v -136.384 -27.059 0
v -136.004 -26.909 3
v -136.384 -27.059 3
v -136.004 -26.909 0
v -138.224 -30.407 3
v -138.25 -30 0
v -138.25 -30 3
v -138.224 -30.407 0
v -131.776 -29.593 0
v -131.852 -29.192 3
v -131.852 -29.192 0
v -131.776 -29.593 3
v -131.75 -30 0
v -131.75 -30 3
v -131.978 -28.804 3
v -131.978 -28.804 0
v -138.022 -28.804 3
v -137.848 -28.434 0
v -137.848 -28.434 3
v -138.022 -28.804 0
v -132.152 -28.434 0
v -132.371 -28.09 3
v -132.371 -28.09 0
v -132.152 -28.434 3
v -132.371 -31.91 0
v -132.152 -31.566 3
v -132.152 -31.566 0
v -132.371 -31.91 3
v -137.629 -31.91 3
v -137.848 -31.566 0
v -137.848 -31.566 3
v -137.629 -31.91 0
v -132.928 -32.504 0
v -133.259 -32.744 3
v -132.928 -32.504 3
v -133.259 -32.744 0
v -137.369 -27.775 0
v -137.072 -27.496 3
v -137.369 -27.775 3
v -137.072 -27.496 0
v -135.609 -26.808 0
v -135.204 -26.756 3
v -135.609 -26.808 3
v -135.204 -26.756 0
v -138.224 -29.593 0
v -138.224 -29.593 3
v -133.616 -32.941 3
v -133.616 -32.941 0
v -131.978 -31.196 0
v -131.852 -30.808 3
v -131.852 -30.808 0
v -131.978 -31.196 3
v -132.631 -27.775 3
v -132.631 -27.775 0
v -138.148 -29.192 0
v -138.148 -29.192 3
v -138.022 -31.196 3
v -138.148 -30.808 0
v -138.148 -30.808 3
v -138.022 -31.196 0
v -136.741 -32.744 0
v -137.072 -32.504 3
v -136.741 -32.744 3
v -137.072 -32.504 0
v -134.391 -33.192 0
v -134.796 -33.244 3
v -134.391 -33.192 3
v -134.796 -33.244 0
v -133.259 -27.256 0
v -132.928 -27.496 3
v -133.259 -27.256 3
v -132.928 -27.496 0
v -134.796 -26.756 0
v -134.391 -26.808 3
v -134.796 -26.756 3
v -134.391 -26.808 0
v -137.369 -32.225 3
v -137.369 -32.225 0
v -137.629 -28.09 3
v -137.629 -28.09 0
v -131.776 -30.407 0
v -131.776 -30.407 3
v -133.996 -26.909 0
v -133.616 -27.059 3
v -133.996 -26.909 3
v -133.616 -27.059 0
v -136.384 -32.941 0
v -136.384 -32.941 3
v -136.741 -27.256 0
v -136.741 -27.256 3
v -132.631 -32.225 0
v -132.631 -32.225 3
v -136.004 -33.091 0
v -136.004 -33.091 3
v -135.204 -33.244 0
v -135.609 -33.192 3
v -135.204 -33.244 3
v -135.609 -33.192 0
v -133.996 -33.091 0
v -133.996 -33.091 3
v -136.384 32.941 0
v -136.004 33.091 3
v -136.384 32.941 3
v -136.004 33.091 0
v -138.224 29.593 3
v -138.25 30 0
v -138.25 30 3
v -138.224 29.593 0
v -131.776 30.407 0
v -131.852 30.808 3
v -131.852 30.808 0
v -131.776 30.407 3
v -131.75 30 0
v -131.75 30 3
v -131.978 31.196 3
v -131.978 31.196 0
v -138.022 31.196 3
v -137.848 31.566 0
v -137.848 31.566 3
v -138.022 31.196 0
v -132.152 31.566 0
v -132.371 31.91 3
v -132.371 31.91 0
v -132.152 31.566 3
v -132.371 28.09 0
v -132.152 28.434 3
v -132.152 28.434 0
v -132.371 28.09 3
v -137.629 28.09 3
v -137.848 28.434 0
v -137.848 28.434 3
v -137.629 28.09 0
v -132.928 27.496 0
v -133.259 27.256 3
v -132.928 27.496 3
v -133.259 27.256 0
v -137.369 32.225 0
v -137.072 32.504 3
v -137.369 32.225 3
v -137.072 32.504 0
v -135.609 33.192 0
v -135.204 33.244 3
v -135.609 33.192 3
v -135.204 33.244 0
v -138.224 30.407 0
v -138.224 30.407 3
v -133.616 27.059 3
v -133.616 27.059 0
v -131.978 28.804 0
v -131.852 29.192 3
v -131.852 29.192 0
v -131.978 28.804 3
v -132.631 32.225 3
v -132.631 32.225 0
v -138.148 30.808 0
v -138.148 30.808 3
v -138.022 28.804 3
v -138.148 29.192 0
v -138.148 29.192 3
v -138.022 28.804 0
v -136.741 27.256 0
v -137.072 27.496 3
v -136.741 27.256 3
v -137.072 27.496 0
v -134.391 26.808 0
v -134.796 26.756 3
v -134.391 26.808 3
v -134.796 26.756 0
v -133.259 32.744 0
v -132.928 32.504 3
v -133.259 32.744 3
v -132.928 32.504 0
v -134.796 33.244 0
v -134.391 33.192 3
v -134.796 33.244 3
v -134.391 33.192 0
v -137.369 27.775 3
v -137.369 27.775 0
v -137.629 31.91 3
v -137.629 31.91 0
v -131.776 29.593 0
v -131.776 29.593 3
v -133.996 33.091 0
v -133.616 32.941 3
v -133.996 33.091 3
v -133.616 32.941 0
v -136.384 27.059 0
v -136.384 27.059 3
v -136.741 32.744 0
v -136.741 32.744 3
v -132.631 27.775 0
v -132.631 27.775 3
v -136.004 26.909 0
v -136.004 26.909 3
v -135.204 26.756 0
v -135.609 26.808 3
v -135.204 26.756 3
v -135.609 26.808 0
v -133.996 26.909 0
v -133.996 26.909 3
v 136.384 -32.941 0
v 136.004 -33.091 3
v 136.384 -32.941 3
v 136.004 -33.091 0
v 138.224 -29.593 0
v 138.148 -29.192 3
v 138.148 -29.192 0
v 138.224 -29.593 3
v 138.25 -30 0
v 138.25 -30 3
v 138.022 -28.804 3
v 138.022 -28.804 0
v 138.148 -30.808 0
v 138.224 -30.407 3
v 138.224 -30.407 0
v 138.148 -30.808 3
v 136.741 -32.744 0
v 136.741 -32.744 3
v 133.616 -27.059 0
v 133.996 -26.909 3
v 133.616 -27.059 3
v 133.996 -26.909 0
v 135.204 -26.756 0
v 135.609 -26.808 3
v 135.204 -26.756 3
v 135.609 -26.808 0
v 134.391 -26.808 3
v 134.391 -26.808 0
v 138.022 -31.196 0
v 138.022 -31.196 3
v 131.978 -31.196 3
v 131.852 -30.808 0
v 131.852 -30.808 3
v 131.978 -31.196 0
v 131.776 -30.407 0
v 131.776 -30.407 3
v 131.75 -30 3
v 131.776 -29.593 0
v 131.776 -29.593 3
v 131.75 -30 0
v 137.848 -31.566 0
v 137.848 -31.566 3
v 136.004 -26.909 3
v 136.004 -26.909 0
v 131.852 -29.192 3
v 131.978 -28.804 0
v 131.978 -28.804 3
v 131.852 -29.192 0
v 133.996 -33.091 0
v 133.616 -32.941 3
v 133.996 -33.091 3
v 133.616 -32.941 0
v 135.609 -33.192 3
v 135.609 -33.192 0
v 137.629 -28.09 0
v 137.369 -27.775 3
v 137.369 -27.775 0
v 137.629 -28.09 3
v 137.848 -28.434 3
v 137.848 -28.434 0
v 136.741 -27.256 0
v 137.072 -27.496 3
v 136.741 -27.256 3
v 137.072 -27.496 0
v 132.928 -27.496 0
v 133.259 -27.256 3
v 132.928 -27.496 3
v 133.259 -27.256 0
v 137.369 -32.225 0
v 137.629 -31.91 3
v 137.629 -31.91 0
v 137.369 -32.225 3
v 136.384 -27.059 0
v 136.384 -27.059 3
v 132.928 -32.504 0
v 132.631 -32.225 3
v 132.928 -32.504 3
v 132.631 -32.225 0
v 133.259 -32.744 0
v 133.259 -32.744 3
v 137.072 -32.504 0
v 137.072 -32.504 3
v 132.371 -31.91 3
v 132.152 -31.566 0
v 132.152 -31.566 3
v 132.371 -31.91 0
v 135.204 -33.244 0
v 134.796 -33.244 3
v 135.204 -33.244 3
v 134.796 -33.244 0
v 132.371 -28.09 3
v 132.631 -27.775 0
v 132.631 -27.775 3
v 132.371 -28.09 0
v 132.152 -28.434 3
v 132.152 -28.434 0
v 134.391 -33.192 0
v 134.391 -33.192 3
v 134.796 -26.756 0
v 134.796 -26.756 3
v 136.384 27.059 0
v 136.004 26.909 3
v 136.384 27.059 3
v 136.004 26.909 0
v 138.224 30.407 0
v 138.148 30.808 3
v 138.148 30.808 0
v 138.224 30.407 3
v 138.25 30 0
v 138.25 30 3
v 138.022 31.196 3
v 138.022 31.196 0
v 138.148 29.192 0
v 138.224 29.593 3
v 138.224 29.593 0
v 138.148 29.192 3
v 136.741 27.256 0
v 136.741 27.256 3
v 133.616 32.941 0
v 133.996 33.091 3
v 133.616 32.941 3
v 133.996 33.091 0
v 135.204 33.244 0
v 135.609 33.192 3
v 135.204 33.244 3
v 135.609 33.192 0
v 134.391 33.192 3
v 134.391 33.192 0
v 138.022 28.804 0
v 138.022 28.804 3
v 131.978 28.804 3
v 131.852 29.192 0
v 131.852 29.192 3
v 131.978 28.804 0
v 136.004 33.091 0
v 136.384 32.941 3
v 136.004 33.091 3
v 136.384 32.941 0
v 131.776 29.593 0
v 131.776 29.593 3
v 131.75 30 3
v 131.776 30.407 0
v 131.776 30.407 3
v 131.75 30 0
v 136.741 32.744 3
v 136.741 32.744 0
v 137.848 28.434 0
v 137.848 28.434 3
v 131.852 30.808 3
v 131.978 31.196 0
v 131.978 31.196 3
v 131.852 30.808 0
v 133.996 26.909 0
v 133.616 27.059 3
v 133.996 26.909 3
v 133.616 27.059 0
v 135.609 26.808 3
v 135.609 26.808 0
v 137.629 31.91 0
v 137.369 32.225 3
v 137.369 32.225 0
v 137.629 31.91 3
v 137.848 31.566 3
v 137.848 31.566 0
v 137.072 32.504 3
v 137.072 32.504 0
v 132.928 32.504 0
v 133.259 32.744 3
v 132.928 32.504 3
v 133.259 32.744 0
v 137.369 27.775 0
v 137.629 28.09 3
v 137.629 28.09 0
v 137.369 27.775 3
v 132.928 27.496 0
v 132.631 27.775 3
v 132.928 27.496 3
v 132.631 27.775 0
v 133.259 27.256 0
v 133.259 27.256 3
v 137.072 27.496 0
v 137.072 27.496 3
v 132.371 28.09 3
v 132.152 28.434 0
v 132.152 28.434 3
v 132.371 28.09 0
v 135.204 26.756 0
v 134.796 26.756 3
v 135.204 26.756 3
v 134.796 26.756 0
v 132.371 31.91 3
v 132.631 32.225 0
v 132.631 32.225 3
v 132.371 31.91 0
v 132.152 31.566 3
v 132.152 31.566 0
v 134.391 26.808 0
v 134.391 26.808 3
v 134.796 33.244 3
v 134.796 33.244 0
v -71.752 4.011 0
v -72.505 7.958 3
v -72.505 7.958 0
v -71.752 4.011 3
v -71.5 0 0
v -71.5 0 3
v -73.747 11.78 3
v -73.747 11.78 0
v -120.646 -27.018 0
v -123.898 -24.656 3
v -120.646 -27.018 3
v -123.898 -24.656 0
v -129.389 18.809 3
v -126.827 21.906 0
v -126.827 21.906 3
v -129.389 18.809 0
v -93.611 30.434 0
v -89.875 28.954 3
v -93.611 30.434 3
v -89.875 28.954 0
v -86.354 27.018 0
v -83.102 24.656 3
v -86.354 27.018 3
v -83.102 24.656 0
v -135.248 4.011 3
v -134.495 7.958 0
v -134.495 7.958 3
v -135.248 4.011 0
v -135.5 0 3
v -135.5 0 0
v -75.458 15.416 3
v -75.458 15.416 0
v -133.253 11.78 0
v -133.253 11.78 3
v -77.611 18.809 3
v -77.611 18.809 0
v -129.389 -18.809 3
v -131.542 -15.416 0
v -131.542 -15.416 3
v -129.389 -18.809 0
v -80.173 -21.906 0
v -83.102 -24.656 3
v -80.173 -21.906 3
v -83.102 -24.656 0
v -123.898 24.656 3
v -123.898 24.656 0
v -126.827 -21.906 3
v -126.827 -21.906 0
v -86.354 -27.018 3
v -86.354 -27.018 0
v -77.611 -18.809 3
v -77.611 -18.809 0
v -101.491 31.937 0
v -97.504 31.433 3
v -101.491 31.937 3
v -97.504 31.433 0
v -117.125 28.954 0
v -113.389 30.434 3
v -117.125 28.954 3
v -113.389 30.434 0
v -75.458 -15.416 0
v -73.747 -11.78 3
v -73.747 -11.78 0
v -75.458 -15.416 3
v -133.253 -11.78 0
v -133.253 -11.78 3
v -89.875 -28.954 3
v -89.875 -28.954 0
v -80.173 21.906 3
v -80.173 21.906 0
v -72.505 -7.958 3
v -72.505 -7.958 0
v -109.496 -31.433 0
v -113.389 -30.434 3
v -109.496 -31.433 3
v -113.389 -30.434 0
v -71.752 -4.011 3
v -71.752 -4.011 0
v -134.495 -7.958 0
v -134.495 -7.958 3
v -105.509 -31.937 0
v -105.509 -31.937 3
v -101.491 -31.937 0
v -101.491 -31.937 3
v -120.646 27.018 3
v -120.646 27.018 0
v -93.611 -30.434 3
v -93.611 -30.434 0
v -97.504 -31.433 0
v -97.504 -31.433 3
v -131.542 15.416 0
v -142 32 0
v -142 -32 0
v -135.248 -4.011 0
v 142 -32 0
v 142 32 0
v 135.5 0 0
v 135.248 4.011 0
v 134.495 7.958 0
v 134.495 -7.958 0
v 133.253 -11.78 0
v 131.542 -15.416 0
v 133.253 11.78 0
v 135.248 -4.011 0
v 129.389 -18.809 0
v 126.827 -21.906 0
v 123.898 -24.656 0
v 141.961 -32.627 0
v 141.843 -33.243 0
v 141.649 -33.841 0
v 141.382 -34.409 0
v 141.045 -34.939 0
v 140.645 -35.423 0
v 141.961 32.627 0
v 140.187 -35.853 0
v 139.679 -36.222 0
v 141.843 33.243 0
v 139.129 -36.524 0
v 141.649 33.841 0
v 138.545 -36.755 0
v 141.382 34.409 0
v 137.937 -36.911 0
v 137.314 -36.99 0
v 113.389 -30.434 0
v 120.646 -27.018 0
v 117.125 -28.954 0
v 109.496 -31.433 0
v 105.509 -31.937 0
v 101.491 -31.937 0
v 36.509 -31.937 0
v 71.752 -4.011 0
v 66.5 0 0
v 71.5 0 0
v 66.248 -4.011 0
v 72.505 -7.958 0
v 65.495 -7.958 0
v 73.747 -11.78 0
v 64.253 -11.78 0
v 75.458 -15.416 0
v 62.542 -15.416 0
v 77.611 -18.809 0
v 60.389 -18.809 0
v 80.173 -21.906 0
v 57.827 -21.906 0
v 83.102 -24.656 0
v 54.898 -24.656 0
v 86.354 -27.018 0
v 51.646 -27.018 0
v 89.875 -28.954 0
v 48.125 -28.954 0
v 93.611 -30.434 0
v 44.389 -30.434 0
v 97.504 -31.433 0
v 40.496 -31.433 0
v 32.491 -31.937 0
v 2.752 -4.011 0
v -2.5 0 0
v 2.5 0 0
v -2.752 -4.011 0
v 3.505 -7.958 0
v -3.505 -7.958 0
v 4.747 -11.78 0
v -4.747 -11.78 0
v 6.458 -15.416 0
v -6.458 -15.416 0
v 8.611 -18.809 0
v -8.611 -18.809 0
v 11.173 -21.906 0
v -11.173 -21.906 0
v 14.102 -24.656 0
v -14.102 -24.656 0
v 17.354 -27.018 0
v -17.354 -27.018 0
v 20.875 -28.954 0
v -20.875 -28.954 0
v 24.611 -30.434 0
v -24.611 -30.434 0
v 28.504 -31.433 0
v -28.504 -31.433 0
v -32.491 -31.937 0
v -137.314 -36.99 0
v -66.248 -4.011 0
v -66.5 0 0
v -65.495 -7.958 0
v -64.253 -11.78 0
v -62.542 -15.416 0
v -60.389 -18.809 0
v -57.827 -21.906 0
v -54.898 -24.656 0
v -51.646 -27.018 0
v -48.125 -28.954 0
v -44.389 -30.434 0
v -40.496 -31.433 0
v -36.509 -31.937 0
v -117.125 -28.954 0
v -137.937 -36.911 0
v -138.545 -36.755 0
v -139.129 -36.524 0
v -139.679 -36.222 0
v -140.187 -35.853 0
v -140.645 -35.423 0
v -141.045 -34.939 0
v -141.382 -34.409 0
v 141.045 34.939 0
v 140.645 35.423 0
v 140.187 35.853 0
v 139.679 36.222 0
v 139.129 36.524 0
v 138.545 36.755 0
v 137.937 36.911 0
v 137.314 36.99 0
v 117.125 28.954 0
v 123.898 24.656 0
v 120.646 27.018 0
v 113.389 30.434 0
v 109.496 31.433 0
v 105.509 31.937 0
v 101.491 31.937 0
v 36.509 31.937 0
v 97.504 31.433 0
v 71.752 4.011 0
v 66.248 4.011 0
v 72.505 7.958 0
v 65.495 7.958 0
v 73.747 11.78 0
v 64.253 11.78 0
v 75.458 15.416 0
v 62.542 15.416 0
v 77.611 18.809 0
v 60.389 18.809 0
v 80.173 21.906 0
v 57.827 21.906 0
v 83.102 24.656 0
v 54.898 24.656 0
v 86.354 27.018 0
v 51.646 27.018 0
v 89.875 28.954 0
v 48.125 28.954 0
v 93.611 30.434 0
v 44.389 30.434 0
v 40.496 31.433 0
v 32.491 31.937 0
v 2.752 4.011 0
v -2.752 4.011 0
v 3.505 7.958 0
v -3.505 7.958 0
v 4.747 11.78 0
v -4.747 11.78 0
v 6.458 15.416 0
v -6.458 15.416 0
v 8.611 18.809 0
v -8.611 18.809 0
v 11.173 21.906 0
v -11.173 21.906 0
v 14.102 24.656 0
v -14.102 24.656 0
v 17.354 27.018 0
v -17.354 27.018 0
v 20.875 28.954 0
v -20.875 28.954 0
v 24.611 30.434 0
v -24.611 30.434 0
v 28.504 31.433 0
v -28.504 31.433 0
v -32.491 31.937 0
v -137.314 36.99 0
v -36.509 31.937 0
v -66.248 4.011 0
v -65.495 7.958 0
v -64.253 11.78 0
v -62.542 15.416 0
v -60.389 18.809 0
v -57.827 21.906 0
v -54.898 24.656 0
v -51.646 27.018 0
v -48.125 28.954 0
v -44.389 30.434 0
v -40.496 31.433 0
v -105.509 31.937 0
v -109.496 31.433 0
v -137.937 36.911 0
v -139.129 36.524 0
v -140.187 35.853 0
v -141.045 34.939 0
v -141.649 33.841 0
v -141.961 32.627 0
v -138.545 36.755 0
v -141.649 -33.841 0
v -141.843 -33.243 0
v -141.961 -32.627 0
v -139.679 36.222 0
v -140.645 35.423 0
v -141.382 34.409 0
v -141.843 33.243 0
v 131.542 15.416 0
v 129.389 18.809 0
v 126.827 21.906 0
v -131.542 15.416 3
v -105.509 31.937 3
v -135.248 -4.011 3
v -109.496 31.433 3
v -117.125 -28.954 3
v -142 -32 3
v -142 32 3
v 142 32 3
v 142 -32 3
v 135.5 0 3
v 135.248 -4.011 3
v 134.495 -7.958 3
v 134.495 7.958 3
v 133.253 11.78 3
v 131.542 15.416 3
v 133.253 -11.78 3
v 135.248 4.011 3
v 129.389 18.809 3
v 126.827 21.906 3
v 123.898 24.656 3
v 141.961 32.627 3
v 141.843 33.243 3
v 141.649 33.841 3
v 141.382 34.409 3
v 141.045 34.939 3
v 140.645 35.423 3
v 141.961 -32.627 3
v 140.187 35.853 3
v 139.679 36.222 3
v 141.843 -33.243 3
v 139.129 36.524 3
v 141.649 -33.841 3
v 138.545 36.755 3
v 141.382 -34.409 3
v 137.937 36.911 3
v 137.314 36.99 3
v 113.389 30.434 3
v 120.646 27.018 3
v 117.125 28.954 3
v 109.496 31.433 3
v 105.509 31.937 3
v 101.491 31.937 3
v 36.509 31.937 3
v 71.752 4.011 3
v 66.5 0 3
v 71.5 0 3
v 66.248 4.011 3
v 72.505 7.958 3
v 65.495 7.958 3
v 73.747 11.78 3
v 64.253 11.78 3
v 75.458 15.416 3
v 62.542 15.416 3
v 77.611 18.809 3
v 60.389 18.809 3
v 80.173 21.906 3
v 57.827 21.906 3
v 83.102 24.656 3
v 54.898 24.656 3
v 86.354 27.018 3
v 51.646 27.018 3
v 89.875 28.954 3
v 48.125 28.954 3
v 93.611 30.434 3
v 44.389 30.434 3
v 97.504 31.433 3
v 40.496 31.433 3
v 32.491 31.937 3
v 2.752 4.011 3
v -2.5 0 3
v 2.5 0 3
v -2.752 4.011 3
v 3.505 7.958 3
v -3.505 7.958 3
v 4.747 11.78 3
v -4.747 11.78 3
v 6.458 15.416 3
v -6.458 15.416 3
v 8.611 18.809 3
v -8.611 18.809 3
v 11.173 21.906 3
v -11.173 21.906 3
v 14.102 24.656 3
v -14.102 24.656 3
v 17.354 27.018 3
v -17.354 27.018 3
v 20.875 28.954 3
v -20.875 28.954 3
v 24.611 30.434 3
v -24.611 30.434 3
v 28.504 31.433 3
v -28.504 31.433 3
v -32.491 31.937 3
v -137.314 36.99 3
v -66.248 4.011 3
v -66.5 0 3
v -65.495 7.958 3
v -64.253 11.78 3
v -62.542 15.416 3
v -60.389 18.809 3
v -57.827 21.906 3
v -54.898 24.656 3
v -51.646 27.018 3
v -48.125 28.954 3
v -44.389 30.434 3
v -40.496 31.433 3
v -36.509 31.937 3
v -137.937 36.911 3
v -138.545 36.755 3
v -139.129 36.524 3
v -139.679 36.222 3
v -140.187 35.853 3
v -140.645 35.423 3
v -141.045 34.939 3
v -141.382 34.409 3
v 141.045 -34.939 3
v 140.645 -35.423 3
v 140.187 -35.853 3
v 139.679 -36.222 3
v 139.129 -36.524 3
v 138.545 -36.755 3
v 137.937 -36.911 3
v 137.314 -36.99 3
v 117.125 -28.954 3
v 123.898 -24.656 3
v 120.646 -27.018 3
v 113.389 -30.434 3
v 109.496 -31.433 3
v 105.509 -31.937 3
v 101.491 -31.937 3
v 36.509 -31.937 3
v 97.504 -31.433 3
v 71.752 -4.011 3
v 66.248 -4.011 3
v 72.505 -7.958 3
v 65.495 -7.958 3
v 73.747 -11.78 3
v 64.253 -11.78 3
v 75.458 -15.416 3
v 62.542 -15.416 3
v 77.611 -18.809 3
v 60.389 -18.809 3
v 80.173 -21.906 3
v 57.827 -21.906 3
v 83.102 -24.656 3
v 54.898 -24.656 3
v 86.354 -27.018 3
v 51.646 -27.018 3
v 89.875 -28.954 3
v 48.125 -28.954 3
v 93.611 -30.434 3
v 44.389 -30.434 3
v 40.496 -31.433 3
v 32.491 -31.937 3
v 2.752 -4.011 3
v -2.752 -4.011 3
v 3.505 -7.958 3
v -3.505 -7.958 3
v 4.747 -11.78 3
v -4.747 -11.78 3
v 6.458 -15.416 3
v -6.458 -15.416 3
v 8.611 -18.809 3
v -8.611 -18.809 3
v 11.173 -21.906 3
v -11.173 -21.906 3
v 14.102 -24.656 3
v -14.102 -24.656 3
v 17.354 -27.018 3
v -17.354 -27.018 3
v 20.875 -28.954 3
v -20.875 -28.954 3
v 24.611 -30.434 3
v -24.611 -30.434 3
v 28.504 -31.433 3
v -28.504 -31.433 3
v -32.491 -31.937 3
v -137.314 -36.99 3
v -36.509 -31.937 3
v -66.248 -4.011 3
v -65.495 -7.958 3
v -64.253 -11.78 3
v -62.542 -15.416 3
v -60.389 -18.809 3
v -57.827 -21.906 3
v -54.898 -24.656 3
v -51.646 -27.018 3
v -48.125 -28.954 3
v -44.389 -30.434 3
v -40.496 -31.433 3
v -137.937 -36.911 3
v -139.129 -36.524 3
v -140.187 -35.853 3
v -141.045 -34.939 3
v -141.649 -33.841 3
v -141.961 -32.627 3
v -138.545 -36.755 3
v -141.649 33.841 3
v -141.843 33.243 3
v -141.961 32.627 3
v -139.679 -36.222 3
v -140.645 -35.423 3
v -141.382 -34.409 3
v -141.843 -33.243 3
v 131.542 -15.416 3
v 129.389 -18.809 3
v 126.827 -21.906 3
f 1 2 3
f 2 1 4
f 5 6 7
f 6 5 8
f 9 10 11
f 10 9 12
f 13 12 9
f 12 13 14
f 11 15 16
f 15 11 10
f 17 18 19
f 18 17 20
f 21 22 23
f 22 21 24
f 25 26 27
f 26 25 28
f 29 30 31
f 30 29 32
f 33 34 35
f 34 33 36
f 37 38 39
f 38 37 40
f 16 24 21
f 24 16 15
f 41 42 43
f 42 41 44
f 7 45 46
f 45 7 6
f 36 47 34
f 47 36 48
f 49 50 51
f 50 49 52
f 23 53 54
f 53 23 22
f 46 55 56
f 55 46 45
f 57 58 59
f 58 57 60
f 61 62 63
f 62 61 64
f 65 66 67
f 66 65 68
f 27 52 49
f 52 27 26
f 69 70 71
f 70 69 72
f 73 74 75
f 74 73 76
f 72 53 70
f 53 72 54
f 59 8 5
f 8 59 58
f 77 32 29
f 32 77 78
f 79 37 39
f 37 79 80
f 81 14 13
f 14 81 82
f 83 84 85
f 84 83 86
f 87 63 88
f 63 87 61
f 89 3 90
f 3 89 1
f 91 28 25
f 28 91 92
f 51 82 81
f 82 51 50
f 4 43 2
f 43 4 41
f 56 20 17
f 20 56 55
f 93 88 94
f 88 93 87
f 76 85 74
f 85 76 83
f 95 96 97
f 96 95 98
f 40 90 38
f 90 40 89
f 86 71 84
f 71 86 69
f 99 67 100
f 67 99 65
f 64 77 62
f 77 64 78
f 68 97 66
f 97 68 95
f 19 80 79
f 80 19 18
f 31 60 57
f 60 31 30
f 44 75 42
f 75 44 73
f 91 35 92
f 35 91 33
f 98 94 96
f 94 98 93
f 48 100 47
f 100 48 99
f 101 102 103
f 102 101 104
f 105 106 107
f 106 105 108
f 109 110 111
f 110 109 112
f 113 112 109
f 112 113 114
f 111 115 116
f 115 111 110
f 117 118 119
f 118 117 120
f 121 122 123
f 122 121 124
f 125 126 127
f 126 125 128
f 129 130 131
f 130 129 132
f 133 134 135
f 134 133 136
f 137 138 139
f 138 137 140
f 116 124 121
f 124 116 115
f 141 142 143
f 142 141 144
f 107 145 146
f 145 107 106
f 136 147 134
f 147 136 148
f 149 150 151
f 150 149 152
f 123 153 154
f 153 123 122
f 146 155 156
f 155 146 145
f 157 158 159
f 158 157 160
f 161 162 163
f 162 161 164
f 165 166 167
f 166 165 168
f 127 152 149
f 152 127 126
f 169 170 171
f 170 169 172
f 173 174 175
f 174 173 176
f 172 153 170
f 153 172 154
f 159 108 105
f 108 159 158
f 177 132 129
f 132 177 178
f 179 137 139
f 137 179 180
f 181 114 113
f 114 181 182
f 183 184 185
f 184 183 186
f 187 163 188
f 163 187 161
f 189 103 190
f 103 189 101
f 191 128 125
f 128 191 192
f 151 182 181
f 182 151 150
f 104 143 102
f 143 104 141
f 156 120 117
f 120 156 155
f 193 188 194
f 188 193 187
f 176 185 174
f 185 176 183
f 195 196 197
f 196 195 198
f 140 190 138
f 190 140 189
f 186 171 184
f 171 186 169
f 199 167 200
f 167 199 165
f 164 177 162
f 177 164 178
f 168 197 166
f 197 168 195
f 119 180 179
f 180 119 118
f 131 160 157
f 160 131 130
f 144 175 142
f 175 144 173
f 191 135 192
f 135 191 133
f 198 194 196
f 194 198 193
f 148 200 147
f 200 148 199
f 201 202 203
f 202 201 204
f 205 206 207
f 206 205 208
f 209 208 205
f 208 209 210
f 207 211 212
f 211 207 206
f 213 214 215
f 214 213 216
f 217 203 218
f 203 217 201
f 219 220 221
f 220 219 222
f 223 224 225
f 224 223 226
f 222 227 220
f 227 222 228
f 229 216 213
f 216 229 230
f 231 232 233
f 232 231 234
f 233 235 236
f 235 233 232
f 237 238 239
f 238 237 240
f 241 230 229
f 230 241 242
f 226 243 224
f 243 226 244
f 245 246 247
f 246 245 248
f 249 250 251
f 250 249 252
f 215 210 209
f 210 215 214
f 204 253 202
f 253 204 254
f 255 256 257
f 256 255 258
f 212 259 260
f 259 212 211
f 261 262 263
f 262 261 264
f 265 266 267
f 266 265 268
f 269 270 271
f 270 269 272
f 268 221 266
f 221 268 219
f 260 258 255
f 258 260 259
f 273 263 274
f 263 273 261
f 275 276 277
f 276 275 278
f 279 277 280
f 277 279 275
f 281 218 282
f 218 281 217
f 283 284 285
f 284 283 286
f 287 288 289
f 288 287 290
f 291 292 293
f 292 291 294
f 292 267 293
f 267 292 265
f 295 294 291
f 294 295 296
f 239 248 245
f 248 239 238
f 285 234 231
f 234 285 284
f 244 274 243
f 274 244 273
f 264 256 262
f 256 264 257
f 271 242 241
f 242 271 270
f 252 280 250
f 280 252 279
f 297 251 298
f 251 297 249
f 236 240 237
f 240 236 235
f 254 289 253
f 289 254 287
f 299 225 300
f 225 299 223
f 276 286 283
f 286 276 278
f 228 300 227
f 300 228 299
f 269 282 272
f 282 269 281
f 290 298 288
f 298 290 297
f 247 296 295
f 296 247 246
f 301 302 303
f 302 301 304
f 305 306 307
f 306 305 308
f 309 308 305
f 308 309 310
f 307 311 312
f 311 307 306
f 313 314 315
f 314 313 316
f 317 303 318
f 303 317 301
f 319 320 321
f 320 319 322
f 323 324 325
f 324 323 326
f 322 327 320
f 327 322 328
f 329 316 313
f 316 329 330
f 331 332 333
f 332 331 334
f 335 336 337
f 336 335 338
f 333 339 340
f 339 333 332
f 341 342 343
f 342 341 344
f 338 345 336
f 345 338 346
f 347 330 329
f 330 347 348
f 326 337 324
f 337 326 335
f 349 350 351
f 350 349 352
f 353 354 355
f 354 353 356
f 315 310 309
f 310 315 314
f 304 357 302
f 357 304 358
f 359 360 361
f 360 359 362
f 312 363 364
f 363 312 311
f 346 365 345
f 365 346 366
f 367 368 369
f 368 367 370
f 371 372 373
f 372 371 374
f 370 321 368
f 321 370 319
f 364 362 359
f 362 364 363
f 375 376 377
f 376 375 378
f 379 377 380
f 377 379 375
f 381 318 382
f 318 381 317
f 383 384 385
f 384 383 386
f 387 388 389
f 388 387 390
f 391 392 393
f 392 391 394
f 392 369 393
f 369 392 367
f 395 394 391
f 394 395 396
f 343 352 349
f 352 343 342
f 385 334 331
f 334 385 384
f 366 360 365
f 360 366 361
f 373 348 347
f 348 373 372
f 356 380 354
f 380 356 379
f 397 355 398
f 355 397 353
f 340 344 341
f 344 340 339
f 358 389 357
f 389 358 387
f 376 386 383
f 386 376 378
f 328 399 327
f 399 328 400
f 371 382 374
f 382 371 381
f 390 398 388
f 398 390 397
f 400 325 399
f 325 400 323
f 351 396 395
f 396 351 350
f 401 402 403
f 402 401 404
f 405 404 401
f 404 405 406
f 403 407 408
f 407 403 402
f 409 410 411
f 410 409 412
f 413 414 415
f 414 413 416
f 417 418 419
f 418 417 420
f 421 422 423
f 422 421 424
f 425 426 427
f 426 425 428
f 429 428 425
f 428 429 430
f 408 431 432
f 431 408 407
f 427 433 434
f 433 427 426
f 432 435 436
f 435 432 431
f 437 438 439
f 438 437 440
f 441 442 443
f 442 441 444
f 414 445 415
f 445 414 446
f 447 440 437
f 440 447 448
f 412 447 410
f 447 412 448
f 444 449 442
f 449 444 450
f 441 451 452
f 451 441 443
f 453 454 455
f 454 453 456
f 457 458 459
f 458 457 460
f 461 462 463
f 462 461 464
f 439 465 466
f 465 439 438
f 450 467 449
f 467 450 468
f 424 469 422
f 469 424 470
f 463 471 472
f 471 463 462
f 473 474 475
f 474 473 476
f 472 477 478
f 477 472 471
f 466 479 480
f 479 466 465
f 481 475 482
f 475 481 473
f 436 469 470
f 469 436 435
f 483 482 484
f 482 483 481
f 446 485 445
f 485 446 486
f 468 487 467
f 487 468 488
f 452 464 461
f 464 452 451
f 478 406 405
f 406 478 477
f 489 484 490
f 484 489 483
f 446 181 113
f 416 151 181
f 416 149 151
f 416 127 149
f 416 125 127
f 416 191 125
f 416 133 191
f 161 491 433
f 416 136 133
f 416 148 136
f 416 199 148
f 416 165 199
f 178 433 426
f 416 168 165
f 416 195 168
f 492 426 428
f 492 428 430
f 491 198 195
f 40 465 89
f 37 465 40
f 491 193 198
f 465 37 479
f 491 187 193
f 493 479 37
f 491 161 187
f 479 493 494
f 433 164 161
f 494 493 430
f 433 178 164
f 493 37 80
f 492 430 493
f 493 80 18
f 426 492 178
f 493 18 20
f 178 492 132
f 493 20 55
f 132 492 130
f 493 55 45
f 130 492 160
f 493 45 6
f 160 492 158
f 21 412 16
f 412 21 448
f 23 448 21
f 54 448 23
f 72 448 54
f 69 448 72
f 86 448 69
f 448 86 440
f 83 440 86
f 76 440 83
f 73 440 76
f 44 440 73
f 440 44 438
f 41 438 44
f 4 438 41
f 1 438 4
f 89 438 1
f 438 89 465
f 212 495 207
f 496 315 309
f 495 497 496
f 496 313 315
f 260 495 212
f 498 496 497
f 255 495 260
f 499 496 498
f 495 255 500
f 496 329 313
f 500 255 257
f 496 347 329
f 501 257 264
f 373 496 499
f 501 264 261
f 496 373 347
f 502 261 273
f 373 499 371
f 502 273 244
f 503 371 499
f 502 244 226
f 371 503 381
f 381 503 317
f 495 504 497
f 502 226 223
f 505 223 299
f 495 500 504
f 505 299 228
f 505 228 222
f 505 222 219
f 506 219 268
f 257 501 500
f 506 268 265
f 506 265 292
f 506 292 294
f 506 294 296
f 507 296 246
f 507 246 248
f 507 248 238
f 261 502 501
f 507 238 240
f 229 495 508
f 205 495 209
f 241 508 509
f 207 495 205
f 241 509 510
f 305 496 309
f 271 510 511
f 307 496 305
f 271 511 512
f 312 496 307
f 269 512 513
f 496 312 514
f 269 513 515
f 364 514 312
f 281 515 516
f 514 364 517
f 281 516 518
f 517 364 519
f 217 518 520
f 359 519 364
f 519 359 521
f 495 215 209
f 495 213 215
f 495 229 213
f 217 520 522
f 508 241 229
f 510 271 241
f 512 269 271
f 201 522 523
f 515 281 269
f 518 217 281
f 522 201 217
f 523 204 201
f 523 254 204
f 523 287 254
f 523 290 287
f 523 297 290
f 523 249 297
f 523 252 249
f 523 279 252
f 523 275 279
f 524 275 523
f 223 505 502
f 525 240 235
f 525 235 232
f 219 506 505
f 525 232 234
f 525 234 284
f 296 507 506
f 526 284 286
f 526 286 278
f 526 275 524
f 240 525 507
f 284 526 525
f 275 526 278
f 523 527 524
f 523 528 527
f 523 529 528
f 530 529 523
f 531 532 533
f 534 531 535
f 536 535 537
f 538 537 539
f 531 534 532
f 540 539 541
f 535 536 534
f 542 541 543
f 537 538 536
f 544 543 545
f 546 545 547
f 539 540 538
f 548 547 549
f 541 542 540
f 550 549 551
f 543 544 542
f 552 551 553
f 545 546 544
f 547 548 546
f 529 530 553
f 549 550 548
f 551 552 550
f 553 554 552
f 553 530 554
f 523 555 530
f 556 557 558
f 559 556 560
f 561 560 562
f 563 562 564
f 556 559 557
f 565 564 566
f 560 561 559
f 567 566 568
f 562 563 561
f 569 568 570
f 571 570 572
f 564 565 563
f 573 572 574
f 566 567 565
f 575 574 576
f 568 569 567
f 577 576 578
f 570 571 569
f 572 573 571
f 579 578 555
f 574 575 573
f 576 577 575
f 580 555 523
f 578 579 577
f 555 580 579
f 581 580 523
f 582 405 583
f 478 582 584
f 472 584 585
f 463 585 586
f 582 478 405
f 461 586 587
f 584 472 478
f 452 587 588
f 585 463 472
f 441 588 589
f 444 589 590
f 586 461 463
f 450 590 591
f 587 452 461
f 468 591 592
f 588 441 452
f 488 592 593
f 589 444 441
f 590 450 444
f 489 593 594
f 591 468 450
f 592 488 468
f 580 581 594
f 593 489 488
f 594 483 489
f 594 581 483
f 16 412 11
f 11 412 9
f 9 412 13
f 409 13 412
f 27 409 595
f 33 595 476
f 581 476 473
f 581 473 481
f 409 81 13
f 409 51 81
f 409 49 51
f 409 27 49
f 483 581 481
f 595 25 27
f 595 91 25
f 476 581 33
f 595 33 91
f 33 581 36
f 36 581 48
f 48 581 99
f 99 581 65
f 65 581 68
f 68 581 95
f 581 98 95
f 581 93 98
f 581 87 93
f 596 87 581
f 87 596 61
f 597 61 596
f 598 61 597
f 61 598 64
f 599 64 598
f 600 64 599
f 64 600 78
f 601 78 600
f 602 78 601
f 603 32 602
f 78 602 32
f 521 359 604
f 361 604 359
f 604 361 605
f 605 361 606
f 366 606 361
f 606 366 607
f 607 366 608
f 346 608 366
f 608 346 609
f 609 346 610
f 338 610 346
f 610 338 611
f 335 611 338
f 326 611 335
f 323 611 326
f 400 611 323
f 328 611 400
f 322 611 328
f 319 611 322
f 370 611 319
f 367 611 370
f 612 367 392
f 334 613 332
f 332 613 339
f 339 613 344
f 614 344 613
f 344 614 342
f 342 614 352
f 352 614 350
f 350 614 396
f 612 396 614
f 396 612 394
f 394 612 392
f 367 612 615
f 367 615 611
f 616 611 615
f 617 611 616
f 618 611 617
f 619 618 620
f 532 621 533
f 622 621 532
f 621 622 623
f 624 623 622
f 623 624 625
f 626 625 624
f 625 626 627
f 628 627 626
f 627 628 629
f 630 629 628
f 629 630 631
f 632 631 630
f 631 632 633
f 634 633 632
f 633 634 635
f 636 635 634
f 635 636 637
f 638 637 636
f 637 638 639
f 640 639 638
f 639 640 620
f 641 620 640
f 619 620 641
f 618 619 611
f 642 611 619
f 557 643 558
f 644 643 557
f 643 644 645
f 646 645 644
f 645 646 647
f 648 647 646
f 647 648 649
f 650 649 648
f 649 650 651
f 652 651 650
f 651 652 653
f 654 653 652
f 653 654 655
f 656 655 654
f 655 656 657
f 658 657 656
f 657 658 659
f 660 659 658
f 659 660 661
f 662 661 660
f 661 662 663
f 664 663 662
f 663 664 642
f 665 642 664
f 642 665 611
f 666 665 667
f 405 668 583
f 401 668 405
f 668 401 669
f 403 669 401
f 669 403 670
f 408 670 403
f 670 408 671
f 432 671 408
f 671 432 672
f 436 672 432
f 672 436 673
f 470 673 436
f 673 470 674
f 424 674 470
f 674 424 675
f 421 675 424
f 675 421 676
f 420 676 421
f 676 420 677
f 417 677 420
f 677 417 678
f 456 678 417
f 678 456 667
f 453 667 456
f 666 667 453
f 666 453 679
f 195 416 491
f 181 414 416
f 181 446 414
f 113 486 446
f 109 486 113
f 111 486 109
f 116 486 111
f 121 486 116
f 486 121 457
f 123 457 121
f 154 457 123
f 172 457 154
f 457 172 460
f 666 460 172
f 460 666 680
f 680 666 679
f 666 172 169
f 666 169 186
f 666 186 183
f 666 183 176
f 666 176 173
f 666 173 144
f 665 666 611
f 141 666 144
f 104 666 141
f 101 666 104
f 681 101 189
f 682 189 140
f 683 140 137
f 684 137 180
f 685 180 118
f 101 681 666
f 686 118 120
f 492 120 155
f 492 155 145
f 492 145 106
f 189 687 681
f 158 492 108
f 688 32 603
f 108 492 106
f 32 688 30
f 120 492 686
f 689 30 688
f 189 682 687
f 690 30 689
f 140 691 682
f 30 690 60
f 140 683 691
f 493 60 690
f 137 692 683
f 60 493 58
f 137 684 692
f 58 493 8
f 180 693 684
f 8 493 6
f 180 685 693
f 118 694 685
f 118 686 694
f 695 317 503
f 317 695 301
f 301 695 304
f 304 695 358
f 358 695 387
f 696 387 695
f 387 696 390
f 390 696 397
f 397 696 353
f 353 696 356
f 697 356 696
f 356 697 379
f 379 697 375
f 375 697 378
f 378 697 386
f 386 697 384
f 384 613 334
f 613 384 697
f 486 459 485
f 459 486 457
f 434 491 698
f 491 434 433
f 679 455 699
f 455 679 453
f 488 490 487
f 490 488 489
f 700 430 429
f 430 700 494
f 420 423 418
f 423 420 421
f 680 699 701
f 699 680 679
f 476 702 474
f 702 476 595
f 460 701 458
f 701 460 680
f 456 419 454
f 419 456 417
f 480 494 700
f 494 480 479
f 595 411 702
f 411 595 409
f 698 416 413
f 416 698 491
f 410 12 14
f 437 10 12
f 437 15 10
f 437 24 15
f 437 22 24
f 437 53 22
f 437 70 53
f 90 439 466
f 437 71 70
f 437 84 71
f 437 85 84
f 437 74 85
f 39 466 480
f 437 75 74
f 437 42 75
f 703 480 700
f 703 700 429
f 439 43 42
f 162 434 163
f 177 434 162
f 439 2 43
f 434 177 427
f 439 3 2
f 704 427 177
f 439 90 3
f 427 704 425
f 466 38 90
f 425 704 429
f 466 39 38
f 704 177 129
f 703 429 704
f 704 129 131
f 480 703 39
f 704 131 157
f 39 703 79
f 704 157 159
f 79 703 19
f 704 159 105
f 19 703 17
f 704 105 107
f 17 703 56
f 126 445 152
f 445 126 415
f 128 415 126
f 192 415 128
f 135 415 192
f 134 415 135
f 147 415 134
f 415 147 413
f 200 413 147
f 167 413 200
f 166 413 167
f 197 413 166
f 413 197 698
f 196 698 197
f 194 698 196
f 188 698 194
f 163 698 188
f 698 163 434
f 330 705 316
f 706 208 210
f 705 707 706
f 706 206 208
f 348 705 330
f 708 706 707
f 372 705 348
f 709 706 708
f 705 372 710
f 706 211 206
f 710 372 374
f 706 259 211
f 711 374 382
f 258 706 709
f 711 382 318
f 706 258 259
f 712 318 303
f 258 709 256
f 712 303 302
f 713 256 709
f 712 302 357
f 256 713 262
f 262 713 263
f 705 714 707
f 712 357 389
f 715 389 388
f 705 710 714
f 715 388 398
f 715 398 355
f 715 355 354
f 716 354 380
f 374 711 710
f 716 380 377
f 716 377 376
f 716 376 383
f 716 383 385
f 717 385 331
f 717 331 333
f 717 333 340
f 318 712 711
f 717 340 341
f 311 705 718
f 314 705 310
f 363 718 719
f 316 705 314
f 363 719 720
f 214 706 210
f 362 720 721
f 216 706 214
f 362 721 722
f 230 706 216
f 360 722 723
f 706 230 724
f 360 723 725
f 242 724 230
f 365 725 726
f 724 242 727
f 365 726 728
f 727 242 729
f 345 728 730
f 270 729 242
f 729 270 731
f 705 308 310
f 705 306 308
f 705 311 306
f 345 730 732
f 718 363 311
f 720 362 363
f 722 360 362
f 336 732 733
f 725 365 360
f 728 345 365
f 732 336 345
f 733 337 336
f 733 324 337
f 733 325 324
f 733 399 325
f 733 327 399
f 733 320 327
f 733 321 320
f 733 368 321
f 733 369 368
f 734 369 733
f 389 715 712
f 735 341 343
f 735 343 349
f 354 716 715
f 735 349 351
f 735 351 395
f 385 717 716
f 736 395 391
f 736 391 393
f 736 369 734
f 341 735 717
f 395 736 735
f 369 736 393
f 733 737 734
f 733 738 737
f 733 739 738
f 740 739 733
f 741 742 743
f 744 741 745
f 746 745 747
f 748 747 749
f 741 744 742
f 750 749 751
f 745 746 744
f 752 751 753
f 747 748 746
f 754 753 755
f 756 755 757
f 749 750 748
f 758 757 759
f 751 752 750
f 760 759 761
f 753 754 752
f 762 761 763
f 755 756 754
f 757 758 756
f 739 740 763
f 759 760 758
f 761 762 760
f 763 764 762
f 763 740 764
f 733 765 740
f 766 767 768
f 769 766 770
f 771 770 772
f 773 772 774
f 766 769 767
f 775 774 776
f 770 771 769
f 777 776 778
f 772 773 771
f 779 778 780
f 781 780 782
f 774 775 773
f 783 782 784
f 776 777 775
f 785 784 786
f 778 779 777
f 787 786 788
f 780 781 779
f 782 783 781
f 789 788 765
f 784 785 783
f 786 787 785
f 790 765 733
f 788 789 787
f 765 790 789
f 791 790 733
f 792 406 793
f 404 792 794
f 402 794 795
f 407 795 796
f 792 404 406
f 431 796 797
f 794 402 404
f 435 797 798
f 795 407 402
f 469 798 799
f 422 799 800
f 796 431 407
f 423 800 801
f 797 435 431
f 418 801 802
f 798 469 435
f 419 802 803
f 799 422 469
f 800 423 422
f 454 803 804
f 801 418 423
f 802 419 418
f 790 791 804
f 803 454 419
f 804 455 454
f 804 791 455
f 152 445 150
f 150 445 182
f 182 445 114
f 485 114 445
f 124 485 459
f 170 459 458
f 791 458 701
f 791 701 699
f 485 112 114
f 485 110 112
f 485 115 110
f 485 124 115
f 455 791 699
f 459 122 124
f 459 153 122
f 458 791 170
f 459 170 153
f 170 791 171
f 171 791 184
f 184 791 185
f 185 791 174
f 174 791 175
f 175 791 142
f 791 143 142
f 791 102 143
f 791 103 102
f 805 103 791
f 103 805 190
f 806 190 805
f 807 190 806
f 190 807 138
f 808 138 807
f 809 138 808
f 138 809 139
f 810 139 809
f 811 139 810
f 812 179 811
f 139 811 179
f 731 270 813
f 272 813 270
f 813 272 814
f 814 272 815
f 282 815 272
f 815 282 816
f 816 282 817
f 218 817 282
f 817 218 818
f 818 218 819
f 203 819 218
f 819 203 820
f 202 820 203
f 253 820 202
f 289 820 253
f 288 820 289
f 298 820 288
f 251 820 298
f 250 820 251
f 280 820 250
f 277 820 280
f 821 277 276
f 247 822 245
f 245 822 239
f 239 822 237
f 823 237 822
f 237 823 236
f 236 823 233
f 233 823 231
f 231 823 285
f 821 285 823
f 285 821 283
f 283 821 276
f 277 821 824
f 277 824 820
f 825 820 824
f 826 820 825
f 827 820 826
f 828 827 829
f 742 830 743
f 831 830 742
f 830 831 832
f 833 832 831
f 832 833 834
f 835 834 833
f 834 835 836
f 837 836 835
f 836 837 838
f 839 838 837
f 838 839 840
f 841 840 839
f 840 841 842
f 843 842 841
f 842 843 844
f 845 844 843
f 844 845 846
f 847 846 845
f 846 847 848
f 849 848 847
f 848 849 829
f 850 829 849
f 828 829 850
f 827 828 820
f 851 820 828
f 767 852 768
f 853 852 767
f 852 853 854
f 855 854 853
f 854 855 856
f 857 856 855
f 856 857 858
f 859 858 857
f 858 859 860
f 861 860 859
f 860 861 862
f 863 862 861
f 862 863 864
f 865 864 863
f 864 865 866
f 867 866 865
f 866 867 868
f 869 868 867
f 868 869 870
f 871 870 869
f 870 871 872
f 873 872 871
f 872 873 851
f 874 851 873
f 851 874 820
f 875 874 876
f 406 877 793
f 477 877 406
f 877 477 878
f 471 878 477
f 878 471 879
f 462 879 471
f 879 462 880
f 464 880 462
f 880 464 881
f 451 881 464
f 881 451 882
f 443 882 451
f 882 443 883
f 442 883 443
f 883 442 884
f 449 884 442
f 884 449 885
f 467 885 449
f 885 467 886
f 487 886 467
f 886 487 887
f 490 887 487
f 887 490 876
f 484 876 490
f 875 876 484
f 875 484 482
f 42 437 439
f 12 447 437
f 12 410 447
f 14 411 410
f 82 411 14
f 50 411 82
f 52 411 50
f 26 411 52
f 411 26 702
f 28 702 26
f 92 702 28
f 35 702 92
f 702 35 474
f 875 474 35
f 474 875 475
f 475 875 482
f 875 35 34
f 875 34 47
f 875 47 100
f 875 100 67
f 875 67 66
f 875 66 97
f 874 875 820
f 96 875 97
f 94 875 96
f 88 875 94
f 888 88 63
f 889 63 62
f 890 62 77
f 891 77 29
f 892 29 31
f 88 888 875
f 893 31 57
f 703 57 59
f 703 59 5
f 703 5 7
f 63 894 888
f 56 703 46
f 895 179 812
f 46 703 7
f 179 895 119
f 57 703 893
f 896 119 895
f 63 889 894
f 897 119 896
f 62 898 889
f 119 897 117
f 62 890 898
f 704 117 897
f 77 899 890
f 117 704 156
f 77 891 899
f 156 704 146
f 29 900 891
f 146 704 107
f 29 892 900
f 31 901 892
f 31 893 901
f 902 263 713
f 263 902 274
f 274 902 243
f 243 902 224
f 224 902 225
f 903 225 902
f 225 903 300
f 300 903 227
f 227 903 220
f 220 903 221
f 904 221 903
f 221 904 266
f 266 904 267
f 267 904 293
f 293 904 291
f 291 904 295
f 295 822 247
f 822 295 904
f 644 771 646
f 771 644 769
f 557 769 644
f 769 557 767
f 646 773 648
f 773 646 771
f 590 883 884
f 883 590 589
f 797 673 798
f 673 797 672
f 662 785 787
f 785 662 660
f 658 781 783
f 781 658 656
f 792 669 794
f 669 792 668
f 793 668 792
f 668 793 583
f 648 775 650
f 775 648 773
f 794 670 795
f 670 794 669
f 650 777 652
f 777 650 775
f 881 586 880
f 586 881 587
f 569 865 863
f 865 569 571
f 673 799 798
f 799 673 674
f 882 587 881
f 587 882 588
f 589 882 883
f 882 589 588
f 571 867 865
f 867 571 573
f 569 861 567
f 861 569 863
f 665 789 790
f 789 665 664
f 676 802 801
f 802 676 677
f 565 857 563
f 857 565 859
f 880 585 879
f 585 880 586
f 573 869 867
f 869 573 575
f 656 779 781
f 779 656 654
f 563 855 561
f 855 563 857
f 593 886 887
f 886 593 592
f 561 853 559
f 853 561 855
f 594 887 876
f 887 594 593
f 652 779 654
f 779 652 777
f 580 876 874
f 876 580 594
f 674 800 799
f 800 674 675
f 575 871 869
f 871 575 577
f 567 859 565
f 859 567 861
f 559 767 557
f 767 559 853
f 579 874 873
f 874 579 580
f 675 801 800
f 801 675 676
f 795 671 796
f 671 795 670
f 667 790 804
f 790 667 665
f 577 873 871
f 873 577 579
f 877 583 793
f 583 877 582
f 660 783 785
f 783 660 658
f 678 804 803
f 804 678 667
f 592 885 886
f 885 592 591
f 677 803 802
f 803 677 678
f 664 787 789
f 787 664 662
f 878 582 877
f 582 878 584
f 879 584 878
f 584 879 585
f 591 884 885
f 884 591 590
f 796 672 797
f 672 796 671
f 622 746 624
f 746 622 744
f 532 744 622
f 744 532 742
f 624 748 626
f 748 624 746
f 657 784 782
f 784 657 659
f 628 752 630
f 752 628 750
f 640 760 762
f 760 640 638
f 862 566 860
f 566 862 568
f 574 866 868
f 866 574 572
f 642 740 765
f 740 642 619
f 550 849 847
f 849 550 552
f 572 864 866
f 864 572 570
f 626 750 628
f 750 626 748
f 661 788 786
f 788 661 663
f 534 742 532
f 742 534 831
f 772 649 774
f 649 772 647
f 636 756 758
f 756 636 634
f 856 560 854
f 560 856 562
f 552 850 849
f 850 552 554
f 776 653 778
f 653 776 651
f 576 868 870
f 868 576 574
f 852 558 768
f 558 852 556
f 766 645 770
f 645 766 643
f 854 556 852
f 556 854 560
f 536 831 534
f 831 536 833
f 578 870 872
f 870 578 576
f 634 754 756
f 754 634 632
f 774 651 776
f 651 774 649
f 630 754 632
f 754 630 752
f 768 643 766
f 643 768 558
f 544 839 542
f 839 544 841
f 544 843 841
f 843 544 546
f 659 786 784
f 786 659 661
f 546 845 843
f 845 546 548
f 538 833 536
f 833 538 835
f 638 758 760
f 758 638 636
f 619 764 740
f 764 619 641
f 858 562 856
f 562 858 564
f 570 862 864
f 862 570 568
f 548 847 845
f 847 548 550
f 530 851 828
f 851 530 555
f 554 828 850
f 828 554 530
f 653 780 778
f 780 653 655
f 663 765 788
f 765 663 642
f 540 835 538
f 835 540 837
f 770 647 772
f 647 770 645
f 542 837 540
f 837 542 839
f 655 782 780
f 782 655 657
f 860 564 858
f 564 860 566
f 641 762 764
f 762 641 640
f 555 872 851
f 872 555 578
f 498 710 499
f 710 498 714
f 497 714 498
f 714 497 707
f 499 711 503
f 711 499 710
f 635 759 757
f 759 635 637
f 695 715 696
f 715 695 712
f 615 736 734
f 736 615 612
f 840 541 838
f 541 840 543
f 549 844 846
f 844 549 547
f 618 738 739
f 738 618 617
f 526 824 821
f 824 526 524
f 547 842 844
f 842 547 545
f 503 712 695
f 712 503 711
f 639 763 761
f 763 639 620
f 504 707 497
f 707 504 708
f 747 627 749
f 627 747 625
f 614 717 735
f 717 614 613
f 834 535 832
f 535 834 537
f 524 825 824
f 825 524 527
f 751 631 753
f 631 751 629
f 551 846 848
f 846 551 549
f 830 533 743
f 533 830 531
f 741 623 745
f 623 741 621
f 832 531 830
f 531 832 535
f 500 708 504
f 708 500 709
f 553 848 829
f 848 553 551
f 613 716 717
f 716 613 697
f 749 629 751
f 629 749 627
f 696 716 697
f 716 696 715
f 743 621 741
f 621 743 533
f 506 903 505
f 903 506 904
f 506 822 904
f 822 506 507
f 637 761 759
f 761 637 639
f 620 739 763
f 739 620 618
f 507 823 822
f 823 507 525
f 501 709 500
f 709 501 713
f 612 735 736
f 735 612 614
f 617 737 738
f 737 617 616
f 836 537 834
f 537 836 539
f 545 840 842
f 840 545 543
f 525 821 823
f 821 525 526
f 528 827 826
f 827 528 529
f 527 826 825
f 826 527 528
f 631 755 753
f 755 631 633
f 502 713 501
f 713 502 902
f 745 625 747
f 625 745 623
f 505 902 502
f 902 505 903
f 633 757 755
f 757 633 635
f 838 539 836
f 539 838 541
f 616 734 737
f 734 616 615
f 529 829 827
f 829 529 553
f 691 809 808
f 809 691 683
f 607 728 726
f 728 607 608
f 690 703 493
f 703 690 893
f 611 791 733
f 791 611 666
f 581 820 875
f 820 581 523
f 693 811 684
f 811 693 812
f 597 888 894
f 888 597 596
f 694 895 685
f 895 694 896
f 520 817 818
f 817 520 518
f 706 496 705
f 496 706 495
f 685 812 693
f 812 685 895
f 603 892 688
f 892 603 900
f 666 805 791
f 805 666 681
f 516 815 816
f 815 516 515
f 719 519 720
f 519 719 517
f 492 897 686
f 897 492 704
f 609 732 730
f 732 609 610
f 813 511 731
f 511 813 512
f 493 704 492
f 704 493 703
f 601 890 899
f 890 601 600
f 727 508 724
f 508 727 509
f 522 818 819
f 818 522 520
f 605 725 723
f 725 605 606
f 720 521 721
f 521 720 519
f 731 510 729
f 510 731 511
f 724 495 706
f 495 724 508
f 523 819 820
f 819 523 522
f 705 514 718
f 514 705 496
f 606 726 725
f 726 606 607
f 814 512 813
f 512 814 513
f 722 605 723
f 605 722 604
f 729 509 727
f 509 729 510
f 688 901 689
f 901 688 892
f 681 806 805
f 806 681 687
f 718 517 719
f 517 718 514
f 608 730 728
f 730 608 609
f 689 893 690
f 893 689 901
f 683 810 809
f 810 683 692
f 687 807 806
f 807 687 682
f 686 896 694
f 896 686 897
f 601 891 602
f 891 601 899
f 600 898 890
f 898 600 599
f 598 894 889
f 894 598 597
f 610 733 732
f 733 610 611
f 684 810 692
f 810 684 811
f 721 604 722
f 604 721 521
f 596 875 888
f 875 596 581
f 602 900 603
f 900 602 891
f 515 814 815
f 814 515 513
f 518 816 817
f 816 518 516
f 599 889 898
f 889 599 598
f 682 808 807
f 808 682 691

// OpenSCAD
$fn = 50;


difference() {
	union() {
		hull() {
			translate(v = [-137.0000000000, 32.0000000000, 0]) {
				cylinder(h = 3, r = 5);
			}
			translate(v = [137.0000000000, 32.0000000000, 0]) {
				cylinder(h = 3, r = 5);
			}
			translate(v = [-137.0000000000, -32.0000000000, 0]) {
				cylinder(h = 3, r = 5);
			}
			translate(v = [137.0000000000, -32.0000000000, 0]) {
				cylinder(h = 3, r = 5);
			}
		}
	}
	union() {
		#translate(v = [-135.0000000000, -30.0000000000, -100.0000000000]) {
			cylinder(h = 200, r = 3.2500000000);
		}
		#translate(v = [-135.0000000000, 30.0000000000, -100.0000000000]) {
			cylinder(h = 200, r = 3.2500000000);
		}
		#translate(v = [135.0000000000, -30.0000000000, -100.0000000000]) {
			cylinder(h = 200, r = 3.2500000000);
		}
		#translate(v = [135.0000000000, 30.0000000000, -100.0000000000]) {
			cylinder(h = 200, r = 3.2500000000);
		}
		#translate(v = [-103.5000000000, 0, 0]) {
			cylinder(h = 3, r = 32.0000000000);
		}
		#translate(v = [-34.5000000000, 0, 0]) {
			cylinder(h = 3, r = 32.0000000000);
		}
		#translate(v = [34.5000000000, 0, 0]) {
			cylinder(h = 3, r = 32.0000000000);
		}
		#translate(v = [103.5000000000, 0, 0]) {
			cylinder(h = 3, r = 32.0000000000);
		}
	}
}
